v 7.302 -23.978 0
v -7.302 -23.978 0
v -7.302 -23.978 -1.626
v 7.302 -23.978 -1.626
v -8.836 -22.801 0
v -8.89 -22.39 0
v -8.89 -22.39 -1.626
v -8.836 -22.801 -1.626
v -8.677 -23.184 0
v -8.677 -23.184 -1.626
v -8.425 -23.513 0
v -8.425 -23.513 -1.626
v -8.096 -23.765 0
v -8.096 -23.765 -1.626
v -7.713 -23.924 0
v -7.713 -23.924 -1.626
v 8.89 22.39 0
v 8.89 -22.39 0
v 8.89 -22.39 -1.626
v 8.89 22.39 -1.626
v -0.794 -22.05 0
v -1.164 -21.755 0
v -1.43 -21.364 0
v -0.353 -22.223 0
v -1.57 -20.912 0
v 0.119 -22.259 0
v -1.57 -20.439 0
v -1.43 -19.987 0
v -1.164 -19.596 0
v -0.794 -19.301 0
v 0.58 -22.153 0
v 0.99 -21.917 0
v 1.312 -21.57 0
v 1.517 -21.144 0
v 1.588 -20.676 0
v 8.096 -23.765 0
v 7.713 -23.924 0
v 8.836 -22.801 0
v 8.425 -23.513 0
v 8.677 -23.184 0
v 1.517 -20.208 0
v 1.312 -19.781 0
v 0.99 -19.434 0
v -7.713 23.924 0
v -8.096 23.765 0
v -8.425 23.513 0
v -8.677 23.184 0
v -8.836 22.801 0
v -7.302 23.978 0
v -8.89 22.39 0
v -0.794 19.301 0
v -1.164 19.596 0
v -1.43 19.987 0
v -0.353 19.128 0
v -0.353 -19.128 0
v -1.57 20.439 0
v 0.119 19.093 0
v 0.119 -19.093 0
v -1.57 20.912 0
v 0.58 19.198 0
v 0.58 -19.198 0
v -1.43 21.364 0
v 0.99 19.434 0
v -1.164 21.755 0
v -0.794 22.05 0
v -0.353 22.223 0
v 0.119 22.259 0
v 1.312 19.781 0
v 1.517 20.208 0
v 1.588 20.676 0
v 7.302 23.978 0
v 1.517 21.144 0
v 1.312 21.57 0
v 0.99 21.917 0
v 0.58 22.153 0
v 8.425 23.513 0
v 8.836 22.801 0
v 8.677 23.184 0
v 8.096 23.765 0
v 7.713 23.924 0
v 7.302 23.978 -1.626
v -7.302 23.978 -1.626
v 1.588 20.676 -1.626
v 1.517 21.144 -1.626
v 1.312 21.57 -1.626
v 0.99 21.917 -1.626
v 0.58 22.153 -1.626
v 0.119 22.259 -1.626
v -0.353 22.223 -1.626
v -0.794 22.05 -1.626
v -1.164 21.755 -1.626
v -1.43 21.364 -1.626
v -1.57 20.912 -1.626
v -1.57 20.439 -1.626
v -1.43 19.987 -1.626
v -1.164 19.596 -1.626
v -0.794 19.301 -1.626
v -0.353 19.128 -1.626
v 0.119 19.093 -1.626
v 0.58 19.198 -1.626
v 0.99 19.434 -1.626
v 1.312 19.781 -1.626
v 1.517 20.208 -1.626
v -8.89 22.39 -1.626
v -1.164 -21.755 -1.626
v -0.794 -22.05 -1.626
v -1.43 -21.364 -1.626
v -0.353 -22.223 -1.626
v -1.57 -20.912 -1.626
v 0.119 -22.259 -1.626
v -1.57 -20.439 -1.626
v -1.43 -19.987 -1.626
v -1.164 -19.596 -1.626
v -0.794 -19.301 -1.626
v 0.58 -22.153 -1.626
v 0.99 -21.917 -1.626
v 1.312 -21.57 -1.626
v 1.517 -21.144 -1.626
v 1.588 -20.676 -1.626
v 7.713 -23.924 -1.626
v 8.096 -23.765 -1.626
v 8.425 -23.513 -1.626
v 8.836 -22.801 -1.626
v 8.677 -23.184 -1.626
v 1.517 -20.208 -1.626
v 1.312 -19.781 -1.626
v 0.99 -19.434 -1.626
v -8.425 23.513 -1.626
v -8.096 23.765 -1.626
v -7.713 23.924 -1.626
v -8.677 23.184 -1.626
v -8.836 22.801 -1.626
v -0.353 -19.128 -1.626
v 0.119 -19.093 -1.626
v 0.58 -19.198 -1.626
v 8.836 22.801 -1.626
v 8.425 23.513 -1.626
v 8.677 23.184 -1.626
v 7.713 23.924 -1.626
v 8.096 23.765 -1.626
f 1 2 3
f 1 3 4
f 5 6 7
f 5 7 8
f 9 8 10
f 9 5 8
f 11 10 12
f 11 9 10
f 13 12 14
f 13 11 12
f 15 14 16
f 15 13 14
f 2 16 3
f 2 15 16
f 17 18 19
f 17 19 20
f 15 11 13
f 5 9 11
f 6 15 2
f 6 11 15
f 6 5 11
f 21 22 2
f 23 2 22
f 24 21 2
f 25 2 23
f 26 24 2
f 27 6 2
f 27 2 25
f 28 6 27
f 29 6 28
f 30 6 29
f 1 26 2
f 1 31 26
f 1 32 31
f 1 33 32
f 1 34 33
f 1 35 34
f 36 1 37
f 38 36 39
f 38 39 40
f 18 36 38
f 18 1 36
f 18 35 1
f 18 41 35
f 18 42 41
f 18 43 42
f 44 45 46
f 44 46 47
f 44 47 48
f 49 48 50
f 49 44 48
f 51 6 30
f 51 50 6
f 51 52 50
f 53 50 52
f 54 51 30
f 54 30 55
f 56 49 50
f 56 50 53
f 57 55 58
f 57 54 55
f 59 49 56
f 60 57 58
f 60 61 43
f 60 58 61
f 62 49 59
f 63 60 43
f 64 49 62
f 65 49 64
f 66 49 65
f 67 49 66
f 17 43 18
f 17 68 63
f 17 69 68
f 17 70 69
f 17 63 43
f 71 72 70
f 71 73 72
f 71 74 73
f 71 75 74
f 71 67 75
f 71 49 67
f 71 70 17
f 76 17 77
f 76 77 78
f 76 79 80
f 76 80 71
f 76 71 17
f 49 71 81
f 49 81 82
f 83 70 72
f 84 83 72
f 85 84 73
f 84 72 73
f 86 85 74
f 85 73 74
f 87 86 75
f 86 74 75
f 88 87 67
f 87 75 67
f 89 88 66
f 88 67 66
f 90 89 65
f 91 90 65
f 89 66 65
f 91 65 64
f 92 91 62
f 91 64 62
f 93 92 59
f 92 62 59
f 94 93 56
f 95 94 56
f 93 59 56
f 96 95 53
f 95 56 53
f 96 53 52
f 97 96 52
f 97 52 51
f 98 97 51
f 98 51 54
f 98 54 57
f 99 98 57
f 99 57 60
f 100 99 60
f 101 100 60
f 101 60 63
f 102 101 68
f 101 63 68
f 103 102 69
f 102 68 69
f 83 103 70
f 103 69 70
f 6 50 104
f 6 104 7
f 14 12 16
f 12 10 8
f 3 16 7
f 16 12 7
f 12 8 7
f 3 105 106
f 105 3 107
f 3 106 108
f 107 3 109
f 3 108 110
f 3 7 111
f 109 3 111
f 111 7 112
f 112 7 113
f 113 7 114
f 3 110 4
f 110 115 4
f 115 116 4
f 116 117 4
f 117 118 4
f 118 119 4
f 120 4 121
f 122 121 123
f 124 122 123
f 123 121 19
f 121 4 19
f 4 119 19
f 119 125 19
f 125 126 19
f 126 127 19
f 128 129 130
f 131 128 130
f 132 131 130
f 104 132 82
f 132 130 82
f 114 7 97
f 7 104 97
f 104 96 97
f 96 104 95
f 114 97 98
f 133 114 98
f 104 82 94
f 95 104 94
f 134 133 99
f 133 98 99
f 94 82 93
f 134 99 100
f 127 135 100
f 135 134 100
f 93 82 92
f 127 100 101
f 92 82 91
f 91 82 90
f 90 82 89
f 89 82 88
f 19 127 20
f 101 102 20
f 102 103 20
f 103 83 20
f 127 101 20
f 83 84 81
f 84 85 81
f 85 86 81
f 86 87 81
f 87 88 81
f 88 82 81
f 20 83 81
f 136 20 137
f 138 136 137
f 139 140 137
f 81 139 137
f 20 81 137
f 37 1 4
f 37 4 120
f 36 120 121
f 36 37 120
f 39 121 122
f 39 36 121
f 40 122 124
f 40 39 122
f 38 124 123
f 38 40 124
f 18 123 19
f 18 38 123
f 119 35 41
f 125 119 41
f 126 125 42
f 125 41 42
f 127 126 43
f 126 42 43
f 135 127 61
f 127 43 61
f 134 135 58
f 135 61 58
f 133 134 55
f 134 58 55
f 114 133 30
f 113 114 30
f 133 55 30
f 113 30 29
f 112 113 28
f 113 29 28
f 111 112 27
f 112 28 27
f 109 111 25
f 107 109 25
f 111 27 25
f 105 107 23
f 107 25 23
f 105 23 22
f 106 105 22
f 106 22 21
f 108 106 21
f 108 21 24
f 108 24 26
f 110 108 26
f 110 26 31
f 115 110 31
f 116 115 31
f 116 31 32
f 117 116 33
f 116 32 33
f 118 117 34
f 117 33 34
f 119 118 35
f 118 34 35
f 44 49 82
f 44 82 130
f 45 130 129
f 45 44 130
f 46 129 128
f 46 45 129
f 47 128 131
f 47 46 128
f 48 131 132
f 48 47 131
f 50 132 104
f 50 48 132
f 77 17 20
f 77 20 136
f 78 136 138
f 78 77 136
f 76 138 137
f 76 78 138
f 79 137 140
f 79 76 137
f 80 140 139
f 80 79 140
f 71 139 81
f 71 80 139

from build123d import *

# Parameters (mm, degrees)
F0_R     = 1.5875
F1_DEPTH = 1.6256


with BuildPart() as f1:
    # F0 (on Top) → F1 (new body)
    with BuildSketch(Plane.XY):
        with BuildLine():
            Line((-7.3025, -23.9776), (7.3025, -23.9776))
            ThreePointArc((7.3025, -23.9776), (8.425032, -23.512632), (8.89, -22.3901))
            Line((8.89, -22.3901), (8.89, 22.3901))
            ThreePointArc((8.89, 22.3901), (8.425032, 23.512632), (7.3025, 23.9776))
            Line((7.3025, 23.9776), (-7.3025, 23.9776))
            ThreePointArc((-7.3025, 23.9776), (-8.425032, 23.512632), (-8.89, 22.3901))
            Line((-8.89, 22.3901), (-8.89, -22.3901))
            ThreePointArc((-8.89, -22.3901), (-8.425032, -23.512632), (-7.3025, -23.9776))
        make_face()
        with Locations((0, -20.6756)):
            Circle(F0_R, mode=Mode.SUBTRACT)
        with Locations((0, 20.6756)):
            Circle(F0_R, mode=Mode.SUBTRACT)
    extrude(amount=-F1_DEPTH)


solid = f1.part
